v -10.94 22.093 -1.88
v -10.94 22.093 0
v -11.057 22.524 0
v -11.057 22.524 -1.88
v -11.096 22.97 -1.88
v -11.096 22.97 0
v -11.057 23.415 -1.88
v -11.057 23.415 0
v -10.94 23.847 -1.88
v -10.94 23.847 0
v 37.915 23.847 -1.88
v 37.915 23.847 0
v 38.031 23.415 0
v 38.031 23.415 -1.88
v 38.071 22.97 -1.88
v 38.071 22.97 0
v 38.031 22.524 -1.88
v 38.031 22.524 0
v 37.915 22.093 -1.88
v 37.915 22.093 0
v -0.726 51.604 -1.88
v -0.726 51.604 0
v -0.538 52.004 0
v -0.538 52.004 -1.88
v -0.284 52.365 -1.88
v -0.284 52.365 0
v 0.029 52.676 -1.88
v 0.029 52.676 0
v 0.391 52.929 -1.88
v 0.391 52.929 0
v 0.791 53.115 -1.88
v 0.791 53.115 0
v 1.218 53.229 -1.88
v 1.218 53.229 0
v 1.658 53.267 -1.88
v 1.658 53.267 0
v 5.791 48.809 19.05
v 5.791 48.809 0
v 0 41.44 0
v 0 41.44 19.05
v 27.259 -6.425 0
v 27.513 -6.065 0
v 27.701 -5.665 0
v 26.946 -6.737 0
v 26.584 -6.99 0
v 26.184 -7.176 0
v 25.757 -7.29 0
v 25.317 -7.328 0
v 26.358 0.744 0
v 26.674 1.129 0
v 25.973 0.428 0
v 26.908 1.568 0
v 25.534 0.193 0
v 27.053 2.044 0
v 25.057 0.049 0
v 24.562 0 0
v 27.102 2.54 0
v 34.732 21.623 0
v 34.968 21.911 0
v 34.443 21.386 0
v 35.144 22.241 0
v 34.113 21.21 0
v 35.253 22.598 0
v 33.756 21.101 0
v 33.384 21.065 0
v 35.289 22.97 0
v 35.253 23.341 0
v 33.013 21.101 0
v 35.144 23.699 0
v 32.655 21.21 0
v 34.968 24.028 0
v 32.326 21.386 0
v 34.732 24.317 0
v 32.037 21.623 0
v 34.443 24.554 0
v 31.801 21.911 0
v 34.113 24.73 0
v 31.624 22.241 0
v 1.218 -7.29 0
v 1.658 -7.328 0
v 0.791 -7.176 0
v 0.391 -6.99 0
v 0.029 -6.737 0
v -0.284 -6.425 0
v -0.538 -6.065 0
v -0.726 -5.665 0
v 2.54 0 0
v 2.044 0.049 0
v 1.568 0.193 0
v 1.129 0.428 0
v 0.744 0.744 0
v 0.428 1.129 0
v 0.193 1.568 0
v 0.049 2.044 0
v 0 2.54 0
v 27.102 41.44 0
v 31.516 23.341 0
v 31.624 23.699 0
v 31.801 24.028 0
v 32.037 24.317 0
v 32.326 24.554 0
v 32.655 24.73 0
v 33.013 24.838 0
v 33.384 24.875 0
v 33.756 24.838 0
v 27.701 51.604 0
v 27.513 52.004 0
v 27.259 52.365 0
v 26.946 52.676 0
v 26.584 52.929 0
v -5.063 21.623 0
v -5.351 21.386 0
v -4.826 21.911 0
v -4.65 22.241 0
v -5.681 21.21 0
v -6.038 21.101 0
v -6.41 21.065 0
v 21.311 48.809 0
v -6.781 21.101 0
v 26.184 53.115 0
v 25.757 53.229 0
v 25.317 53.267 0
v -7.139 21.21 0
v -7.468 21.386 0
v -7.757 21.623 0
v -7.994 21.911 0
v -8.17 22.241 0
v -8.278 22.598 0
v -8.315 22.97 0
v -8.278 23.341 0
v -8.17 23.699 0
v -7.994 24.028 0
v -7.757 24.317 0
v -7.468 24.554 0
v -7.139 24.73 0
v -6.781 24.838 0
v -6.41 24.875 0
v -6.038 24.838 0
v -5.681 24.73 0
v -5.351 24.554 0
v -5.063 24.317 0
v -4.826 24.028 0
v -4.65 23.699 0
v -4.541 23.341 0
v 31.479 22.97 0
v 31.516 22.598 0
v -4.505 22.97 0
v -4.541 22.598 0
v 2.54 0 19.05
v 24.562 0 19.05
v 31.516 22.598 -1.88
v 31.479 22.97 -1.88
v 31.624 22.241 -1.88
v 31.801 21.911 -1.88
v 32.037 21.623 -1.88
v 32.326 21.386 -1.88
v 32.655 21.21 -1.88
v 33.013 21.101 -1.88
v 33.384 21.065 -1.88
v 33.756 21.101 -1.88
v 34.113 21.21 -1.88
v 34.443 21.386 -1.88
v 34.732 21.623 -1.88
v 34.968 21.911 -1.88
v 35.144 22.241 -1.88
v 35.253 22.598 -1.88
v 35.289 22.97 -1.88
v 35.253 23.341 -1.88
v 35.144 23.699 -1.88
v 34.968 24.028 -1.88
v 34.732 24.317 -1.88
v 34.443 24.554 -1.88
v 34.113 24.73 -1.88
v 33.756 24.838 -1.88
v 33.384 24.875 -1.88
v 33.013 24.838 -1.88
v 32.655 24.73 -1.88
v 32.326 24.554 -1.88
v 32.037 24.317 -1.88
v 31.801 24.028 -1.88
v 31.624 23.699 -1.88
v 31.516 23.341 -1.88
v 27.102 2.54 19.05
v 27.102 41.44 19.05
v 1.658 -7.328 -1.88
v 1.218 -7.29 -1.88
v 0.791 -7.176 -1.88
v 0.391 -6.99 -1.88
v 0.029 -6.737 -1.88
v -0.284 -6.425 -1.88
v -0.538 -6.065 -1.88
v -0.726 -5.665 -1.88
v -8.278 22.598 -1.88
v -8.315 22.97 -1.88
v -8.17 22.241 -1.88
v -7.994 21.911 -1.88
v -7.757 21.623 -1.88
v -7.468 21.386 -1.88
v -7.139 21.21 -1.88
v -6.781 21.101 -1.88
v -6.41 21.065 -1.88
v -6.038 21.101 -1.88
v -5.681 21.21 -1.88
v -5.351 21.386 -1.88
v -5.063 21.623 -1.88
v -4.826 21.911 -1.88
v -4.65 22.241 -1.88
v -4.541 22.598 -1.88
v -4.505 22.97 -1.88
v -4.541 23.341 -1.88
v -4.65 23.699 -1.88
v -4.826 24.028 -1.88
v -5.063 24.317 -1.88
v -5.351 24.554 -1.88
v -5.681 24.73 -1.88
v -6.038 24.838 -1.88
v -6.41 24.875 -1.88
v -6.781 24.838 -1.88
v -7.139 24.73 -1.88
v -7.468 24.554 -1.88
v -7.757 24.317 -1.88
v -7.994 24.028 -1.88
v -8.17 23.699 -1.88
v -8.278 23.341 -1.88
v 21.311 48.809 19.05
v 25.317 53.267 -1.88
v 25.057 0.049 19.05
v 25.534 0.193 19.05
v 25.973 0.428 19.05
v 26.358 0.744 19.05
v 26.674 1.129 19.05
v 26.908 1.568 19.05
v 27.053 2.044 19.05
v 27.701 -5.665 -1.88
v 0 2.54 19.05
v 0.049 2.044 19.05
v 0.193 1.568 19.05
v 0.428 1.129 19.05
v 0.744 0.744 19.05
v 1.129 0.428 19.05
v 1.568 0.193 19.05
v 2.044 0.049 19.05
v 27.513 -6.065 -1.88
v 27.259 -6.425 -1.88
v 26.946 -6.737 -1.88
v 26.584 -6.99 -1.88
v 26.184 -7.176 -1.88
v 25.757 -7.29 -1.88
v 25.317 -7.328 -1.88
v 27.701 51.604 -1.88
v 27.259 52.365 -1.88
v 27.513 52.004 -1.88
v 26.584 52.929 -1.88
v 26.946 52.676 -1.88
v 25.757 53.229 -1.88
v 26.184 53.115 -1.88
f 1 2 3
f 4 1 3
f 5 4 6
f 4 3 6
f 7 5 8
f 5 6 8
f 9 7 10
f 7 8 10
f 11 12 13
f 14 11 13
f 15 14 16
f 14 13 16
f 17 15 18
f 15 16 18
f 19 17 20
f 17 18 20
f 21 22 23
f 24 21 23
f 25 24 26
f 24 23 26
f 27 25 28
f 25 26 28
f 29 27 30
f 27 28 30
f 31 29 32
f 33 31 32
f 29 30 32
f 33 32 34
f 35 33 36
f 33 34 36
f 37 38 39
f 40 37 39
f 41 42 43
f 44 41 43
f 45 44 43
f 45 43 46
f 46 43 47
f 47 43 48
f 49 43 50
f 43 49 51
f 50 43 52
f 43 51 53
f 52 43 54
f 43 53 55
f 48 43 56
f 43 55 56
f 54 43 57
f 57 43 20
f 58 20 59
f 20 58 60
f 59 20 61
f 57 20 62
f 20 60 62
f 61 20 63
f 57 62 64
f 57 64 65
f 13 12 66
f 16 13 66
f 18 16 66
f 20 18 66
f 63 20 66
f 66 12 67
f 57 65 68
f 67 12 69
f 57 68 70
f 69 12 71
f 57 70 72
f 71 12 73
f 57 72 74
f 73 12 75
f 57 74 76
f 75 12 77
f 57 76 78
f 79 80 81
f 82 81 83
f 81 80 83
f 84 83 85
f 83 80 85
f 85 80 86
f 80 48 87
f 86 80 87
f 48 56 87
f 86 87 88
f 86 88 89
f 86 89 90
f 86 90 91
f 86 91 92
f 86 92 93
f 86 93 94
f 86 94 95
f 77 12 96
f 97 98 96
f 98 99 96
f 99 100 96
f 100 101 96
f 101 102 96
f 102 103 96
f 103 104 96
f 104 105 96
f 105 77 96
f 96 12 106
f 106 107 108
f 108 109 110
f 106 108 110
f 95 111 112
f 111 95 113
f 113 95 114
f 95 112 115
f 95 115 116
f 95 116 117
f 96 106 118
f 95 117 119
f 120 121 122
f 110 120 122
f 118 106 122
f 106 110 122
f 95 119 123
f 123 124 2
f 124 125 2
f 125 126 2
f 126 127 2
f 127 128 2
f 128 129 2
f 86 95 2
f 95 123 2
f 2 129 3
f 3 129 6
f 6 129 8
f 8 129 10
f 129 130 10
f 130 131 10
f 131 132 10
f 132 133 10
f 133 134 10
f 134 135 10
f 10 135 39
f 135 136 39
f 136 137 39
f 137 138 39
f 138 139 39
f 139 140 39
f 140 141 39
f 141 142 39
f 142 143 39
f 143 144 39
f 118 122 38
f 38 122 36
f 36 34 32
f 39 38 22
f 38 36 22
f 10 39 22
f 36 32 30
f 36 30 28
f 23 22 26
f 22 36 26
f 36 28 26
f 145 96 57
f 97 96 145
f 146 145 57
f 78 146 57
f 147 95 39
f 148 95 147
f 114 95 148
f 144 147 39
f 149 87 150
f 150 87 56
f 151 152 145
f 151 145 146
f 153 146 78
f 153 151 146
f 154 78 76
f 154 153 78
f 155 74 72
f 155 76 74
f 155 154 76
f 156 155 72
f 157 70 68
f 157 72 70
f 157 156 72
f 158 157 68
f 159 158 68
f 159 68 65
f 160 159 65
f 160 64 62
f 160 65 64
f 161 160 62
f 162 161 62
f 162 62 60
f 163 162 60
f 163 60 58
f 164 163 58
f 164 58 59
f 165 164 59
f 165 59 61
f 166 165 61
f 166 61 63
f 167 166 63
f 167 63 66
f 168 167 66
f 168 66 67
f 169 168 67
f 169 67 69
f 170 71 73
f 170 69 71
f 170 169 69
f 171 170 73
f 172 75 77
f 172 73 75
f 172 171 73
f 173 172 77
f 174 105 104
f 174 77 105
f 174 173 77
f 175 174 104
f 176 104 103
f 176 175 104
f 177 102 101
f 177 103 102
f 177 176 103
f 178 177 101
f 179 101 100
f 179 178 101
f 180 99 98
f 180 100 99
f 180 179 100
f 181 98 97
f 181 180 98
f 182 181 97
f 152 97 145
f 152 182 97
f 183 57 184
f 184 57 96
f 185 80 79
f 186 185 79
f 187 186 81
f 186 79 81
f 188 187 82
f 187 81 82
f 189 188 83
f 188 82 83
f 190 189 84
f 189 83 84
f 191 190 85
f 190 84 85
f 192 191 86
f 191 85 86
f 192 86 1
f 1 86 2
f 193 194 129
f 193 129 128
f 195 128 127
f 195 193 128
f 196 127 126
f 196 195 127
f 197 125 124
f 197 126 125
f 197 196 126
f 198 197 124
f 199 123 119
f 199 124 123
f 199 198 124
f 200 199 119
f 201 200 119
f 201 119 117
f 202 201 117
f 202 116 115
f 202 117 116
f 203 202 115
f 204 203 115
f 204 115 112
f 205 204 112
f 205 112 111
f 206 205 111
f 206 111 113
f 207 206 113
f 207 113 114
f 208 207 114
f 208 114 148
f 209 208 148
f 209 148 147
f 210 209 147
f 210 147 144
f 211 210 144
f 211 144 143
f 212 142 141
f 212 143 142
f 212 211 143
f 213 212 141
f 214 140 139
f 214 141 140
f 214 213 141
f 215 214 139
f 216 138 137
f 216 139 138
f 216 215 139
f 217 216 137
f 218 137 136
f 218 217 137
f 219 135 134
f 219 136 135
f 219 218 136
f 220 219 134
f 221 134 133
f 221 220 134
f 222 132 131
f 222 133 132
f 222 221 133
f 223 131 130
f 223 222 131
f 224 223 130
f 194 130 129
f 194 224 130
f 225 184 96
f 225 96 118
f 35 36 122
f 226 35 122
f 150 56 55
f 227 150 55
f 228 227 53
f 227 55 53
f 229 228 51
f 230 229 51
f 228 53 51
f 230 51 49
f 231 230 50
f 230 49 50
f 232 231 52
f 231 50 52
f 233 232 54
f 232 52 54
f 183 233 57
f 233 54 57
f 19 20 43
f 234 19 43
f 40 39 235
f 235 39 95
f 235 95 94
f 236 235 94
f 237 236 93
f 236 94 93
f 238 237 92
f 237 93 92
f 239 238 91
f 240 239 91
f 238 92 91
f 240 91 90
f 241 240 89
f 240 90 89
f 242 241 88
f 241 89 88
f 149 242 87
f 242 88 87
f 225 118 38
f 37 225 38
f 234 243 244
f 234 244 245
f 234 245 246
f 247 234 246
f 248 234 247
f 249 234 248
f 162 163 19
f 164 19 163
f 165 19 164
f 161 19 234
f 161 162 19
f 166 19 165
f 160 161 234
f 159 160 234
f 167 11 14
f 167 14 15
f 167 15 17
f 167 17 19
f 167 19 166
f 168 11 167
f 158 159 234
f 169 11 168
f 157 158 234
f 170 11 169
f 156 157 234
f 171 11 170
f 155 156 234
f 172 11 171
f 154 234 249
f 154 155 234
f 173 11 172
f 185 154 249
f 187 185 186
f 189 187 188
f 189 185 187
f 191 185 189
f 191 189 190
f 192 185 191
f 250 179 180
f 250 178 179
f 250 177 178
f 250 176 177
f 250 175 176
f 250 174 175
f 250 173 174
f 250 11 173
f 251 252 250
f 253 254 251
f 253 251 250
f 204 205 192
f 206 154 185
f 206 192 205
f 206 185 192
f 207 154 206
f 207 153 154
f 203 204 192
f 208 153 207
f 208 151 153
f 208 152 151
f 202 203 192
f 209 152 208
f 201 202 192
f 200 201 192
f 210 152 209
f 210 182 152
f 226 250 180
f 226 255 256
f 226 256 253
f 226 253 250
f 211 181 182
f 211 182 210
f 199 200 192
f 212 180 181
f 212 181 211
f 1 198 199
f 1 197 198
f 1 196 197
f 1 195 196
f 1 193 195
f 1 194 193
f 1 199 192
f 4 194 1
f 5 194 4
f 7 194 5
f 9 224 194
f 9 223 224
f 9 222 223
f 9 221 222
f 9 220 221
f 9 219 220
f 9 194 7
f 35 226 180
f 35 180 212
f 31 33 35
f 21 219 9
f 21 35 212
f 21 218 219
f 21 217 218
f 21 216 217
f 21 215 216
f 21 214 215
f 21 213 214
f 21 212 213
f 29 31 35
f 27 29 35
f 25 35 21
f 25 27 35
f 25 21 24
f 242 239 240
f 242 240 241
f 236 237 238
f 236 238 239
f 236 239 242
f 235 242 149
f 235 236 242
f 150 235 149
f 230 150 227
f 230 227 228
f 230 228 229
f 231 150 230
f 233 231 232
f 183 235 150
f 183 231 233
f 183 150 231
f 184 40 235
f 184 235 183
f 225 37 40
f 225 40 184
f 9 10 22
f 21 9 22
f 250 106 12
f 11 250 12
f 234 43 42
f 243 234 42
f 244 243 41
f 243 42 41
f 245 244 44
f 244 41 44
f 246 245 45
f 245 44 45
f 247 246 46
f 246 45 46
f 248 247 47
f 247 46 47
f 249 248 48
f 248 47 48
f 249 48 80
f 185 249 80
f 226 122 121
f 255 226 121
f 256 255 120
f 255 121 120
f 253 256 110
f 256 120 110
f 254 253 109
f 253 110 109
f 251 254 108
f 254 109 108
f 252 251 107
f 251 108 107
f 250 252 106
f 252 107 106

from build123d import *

# Parameters (mm, degrees)
BOSS_EXTRUDE1_DEPTH     = 19.05
BOSS_EXTRUDE2_DEPTH     = 1.8796
CUT_EXTRUDE1_DEPTH      = 22.606
CUT_EXTRUDE1_DEPTH_BACK = 20.4216
SKETCH6_R               = 1.905


with BuildPart() as part:
    # Sketch1 → Boss-Extrude1 (new body)
    with BuildSketch(Plane.XY):
        with BuildLine():
            Line((2.54, 0), (24.5618, 0))
            ThreePointArc((24.5618, 0), (26.357851224, 0.743948776), (27.1018, 2.54))
            Line((27.1018, 2.54), (27.1018, 41.4401))
            Line((27.1018, 41.4401), (21.3106, 48.809471297))
            Line((21.3106, 48.809471297), (5.7912, 48.809471297))
            Line((5.7912, 48.809471297), (0, 41.4401))
            Line((0, 41.4401), (0, 2.54))
            ThreePointArc((0, 2.54), (0.743948776, 0.743948776), (2.54, 0))
        make_face()
    extrude(amount=BOSS_EXTRUDE1_DEPTH)

    # Sketch2 → Boss-Extrude2 (add)
    with BuildSketch(Plane.XY):
        with BuildLine():
            Line((1.657581985, 53.267171297), (25.317218015, 53.267171297))
            ThreePointArc((25.317218015, 53.267171297), (26.770442849, 52.81037498), (27.700968665, 51.604287506))
            Line((27.700968665, 51.604287506), (37.914530402, 23.846751857))
            ThreePointArc((37.914530402, 23.846751857), (38.070779753, 22.969635649), (37.914530402, 22.09251944))
            Line((37.914530402, 22.09251944), (27.700968665, -5.665016208))
            ThreePointArc((27.700968665, -5.665016208), (26.770442849, -6.871103683), (25.317218015, -7.3279))
            Line((25.317218015, -7.3279), (1.657581985, -7.3279))
            ThreePointArc((1.657581985, -7.3279), (0.204357151, -6.871103683), (-0.726168665, -5.665016208))
            Line((-0.726168665, -5.665016208), (-10.939730402, 22.09251944))
            ThreePointArc((-10.939730402, 22.09251944), (-11.095979753, 22.969635649), (-10.939730402, 23.846751857))
            Line((-10.939730402, 23.846751857), (-0.726168665, 51.604287506))
            ThreePointArc((-0.726168665, 51.604287506), (0.204357151, 52.81037498), (1.657581985, 53.267171297))
        make_face()
    extrude(amount=-BOSS_EXTRUDE2_DEPTH)

    # Sketch6 → Cut-Extrude1 (cut, two sides: drawn at the far end of the back side and taken through both)
    with BuildSketch(Plane.XY.offset(-CUT_EXTRUDE1_DEPTH_BACK)):
        with Locations(Location((33.384479753, 22.969635649, 0), (0, 0, 180))):
            Circle(SKETCH6_R)
        with Locations(Location((-6.409679753, 22.969635649, 0), (0, 0, 180))):
            Circle(SKETCH6_R)
    extrude(amount=CUT_EXTRUDE1_DEPTH + CUT_EXTRUDE1_DEPTH_BACK, mode=Mode.SUBTRACT)


solid = part.part
